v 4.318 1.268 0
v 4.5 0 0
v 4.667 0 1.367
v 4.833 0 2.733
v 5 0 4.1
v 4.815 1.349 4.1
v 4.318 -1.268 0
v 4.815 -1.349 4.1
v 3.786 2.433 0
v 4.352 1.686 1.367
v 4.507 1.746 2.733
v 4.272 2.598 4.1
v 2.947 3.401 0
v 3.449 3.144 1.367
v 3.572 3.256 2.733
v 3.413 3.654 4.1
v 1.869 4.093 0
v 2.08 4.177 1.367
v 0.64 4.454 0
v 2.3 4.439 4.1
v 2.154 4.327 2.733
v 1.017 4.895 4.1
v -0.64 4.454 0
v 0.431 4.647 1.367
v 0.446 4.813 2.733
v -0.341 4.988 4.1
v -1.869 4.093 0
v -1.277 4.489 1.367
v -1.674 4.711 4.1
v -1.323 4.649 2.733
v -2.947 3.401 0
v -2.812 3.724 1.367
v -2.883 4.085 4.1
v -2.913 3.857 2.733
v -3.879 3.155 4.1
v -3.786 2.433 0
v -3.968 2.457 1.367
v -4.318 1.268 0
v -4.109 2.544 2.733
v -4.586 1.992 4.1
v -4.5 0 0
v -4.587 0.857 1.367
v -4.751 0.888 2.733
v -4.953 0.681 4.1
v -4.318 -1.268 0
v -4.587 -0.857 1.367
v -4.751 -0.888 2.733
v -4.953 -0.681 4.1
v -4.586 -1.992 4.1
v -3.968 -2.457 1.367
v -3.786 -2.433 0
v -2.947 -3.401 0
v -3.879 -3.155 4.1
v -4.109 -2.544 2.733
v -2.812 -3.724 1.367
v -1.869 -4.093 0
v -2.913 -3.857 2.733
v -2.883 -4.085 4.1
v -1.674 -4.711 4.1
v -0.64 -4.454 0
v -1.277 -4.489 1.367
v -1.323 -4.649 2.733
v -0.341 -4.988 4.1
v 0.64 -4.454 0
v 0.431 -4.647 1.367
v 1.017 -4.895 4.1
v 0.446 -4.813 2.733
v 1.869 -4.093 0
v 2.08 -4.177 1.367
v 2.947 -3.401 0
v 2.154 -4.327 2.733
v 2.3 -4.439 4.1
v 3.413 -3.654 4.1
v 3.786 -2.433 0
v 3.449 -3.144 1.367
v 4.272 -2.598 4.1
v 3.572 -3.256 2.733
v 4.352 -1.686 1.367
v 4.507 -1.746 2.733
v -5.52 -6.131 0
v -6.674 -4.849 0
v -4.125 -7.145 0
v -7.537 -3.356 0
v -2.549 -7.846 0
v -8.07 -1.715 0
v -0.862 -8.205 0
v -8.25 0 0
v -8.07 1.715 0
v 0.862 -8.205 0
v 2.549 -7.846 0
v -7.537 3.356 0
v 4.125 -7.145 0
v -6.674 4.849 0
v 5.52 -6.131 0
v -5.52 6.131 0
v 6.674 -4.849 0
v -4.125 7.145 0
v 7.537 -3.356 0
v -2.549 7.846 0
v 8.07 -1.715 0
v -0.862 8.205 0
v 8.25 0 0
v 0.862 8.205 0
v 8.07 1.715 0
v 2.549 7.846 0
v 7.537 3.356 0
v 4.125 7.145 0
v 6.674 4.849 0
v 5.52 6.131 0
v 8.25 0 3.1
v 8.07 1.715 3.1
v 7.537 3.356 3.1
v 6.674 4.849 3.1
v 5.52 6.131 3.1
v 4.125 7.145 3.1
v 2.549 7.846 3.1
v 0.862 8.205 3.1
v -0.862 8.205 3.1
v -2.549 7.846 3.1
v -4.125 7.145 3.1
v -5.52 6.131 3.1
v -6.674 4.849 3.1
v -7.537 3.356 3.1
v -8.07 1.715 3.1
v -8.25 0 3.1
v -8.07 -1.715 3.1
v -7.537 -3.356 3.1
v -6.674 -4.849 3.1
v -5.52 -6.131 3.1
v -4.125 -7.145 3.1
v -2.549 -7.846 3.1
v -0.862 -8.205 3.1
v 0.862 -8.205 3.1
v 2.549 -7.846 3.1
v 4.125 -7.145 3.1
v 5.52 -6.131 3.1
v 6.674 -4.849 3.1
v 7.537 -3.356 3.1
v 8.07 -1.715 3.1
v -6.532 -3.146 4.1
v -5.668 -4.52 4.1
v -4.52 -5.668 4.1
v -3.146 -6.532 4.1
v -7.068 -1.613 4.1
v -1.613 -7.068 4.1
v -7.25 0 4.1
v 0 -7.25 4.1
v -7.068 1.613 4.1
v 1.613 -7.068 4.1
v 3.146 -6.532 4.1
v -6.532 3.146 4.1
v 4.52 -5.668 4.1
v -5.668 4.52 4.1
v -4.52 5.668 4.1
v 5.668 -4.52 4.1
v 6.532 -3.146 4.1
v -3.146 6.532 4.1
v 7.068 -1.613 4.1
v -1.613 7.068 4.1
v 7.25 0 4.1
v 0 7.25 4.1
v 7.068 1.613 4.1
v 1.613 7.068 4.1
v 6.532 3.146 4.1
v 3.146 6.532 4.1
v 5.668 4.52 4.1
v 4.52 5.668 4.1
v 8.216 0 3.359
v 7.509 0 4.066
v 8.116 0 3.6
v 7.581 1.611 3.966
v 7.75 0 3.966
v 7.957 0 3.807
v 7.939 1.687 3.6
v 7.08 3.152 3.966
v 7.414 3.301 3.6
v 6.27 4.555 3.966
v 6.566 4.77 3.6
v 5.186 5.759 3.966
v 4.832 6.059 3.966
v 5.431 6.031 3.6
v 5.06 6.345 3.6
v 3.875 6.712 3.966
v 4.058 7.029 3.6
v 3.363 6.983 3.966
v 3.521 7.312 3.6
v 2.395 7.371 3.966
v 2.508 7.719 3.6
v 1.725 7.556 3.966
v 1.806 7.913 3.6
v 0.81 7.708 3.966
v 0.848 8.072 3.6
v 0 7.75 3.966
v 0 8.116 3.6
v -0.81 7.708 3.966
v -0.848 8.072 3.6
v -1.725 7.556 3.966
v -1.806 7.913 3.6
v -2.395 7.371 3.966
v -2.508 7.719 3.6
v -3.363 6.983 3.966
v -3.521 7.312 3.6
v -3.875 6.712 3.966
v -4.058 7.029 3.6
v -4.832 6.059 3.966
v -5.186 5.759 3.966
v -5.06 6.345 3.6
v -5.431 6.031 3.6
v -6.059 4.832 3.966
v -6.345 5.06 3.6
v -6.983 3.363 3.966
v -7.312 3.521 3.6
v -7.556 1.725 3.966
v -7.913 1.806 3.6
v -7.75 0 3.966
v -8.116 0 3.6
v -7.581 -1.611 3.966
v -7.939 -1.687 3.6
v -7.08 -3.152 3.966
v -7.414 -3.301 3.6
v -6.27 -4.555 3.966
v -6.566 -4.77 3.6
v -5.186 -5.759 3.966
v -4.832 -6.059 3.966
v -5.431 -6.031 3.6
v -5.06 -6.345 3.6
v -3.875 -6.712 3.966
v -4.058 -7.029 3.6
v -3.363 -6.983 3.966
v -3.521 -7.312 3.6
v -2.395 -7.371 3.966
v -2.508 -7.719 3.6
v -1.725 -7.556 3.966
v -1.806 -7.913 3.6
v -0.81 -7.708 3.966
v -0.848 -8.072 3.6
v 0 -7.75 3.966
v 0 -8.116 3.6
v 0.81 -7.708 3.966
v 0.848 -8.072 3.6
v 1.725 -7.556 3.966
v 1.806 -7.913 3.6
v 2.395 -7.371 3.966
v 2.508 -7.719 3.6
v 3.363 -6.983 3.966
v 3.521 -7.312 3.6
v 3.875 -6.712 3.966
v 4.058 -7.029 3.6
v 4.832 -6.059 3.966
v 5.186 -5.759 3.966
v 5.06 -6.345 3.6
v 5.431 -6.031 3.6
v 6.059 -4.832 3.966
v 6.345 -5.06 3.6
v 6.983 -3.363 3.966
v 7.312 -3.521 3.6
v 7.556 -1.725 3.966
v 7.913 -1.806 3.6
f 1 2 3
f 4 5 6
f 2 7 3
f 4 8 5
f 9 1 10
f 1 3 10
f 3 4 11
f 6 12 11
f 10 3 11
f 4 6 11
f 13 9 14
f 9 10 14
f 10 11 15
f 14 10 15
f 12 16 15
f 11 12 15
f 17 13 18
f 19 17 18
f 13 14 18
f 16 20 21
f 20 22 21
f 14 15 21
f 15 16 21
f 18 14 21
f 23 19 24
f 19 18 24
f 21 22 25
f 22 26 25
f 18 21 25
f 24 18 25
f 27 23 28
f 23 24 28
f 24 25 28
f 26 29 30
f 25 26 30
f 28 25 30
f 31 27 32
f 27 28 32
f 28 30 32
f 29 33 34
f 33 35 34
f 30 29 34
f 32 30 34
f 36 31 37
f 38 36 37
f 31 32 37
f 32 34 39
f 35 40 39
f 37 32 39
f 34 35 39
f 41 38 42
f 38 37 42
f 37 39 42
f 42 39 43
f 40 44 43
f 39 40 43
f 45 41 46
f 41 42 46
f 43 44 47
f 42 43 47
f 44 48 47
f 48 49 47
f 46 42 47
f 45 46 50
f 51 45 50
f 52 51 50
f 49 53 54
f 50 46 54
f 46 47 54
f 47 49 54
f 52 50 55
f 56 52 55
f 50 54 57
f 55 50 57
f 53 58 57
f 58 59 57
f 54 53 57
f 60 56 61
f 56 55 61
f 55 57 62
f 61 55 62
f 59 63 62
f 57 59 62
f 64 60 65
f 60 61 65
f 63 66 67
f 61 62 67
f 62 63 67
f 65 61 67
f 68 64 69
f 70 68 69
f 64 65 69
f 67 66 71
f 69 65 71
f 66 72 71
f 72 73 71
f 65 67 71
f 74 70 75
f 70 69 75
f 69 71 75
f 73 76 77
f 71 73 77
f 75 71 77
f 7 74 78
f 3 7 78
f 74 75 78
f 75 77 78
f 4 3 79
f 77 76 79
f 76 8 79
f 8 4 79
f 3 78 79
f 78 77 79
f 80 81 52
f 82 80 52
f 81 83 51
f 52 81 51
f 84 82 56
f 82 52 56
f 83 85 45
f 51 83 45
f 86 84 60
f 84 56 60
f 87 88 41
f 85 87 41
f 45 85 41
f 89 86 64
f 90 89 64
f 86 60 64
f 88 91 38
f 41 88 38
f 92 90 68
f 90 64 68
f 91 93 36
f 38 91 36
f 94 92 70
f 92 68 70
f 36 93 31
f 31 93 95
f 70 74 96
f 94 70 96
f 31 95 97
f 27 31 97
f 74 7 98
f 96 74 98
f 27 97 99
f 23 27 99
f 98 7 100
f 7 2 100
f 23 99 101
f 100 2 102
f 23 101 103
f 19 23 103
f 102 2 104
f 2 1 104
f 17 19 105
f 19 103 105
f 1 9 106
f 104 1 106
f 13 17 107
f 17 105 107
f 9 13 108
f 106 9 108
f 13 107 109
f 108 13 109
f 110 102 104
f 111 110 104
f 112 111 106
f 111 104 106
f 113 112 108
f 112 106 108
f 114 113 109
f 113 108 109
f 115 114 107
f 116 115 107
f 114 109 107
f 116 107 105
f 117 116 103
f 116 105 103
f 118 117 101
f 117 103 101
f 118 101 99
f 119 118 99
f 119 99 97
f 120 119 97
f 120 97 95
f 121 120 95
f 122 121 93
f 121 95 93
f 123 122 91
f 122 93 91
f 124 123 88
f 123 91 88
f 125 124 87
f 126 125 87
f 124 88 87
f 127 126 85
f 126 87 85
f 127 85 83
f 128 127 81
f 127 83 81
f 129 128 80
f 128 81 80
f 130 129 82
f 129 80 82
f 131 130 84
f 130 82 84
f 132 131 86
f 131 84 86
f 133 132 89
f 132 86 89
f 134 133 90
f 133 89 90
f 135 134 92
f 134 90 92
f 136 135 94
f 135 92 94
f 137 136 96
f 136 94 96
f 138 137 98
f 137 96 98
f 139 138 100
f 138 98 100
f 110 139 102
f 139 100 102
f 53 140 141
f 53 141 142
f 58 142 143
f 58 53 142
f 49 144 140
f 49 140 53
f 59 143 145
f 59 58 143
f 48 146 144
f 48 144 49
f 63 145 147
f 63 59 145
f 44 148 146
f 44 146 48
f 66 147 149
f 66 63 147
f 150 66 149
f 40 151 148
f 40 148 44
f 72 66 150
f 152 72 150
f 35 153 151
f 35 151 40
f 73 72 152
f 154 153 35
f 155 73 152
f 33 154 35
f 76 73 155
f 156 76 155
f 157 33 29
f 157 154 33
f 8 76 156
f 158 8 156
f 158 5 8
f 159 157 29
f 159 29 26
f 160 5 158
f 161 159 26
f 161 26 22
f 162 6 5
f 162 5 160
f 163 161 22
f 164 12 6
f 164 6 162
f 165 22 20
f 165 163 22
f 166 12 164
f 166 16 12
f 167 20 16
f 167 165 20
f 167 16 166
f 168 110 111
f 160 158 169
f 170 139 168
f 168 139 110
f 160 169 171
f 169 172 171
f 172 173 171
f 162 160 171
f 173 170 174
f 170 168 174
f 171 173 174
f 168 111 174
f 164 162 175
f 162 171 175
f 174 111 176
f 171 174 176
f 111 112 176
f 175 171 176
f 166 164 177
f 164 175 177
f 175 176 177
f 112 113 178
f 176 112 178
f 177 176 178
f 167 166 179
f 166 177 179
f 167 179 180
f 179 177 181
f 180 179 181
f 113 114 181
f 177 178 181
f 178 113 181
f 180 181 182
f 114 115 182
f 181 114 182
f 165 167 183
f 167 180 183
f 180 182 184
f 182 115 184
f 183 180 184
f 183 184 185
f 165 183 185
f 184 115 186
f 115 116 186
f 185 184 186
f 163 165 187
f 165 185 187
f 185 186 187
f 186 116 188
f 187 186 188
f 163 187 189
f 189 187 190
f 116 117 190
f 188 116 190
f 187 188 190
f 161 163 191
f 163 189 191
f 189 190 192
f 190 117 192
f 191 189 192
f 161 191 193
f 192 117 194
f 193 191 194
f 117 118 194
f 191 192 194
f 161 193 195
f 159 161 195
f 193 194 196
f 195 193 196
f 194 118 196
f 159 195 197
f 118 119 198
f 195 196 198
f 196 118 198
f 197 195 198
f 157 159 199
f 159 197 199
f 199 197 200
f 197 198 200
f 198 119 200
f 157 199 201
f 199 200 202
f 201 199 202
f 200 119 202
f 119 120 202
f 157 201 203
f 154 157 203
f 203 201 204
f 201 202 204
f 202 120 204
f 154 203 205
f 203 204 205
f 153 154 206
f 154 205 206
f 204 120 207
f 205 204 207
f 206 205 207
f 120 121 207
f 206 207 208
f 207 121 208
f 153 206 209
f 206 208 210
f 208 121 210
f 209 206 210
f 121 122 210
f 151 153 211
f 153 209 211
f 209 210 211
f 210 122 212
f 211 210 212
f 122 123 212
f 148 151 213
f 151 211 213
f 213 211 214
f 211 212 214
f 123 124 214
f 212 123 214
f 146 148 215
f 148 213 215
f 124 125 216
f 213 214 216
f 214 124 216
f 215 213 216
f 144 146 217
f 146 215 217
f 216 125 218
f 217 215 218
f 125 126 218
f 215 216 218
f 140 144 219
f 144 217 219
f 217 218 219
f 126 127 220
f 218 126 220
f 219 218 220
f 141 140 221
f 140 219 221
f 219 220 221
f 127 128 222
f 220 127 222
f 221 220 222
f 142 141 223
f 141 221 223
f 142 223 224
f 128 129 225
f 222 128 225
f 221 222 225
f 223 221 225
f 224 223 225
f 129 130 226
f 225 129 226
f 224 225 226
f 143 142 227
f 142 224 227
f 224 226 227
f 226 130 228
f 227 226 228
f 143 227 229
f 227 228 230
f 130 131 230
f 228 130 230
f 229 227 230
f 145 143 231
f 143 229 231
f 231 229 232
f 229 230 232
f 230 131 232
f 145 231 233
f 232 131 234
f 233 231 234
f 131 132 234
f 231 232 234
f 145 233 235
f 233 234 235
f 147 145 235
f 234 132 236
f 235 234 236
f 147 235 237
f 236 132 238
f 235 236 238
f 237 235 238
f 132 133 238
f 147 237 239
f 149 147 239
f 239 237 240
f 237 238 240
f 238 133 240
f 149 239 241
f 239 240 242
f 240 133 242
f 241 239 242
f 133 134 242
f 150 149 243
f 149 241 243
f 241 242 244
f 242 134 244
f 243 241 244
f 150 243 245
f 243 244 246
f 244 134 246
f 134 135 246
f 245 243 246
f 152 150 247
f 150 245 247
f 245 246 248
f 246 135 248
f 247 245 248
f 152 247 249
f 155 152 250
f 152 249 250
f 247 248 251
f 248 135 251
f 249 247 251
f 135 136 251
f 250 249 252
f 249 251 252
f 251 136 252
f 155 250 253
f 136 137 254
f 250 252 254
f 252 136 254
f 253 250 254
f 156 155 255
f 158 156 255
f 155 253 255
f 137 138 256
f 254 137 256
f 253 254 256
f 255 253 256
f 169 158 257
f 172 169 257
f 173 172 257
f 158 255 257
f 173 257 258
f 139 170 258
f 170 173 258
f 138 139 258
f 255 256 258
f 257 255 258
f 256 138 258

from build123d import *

# Parameters (mm, degrees)
F0_R     = 8.25
F0_R_2   = 4.5
F1_DEPTH = 4.1
F2_SIZE2 = 0.49999
F2_SIZE  = 4.09999
F3_R     = 1


# Not quite as in the source:
# - a fillet or chamfer is up to 0.001 mm smaller than in the source, because OpenCascade refuses the exact size


with BuildPart() as f1:
    # F0 (on Top) → F1 (new body)
    with BuildSketch(Plane.XY):
        Circle(F0_R)
        Circle(F0_R_2, mode=Mode.SUBTRACT)
    extrude(amount=F1_DEPTH)

    # F2 (size 4.1 and 0.5 in the source; OpenCascade refuses exactly that, so slightly less here)
    f2_edges = [f1.edges().sort_by_distance(p)[0] for p in [
        (-4.5, 0, 4.1),
    ]]
    f2_side = f1.faces().sort_by_distance((-4.5, 0, 2.05))[0]
    chamfer(f2_edges, length=F2_SIZE, length2=F2_SIZE2, reference=f2_side)

    # F3
    f3_edges = [f1.edges().sort_by_distance(p)[0] for p in [
        (-8.25, 0, 4.1),
    ]]
    fillet(f3_edges, radius=F3_R)


solid = f1.part
